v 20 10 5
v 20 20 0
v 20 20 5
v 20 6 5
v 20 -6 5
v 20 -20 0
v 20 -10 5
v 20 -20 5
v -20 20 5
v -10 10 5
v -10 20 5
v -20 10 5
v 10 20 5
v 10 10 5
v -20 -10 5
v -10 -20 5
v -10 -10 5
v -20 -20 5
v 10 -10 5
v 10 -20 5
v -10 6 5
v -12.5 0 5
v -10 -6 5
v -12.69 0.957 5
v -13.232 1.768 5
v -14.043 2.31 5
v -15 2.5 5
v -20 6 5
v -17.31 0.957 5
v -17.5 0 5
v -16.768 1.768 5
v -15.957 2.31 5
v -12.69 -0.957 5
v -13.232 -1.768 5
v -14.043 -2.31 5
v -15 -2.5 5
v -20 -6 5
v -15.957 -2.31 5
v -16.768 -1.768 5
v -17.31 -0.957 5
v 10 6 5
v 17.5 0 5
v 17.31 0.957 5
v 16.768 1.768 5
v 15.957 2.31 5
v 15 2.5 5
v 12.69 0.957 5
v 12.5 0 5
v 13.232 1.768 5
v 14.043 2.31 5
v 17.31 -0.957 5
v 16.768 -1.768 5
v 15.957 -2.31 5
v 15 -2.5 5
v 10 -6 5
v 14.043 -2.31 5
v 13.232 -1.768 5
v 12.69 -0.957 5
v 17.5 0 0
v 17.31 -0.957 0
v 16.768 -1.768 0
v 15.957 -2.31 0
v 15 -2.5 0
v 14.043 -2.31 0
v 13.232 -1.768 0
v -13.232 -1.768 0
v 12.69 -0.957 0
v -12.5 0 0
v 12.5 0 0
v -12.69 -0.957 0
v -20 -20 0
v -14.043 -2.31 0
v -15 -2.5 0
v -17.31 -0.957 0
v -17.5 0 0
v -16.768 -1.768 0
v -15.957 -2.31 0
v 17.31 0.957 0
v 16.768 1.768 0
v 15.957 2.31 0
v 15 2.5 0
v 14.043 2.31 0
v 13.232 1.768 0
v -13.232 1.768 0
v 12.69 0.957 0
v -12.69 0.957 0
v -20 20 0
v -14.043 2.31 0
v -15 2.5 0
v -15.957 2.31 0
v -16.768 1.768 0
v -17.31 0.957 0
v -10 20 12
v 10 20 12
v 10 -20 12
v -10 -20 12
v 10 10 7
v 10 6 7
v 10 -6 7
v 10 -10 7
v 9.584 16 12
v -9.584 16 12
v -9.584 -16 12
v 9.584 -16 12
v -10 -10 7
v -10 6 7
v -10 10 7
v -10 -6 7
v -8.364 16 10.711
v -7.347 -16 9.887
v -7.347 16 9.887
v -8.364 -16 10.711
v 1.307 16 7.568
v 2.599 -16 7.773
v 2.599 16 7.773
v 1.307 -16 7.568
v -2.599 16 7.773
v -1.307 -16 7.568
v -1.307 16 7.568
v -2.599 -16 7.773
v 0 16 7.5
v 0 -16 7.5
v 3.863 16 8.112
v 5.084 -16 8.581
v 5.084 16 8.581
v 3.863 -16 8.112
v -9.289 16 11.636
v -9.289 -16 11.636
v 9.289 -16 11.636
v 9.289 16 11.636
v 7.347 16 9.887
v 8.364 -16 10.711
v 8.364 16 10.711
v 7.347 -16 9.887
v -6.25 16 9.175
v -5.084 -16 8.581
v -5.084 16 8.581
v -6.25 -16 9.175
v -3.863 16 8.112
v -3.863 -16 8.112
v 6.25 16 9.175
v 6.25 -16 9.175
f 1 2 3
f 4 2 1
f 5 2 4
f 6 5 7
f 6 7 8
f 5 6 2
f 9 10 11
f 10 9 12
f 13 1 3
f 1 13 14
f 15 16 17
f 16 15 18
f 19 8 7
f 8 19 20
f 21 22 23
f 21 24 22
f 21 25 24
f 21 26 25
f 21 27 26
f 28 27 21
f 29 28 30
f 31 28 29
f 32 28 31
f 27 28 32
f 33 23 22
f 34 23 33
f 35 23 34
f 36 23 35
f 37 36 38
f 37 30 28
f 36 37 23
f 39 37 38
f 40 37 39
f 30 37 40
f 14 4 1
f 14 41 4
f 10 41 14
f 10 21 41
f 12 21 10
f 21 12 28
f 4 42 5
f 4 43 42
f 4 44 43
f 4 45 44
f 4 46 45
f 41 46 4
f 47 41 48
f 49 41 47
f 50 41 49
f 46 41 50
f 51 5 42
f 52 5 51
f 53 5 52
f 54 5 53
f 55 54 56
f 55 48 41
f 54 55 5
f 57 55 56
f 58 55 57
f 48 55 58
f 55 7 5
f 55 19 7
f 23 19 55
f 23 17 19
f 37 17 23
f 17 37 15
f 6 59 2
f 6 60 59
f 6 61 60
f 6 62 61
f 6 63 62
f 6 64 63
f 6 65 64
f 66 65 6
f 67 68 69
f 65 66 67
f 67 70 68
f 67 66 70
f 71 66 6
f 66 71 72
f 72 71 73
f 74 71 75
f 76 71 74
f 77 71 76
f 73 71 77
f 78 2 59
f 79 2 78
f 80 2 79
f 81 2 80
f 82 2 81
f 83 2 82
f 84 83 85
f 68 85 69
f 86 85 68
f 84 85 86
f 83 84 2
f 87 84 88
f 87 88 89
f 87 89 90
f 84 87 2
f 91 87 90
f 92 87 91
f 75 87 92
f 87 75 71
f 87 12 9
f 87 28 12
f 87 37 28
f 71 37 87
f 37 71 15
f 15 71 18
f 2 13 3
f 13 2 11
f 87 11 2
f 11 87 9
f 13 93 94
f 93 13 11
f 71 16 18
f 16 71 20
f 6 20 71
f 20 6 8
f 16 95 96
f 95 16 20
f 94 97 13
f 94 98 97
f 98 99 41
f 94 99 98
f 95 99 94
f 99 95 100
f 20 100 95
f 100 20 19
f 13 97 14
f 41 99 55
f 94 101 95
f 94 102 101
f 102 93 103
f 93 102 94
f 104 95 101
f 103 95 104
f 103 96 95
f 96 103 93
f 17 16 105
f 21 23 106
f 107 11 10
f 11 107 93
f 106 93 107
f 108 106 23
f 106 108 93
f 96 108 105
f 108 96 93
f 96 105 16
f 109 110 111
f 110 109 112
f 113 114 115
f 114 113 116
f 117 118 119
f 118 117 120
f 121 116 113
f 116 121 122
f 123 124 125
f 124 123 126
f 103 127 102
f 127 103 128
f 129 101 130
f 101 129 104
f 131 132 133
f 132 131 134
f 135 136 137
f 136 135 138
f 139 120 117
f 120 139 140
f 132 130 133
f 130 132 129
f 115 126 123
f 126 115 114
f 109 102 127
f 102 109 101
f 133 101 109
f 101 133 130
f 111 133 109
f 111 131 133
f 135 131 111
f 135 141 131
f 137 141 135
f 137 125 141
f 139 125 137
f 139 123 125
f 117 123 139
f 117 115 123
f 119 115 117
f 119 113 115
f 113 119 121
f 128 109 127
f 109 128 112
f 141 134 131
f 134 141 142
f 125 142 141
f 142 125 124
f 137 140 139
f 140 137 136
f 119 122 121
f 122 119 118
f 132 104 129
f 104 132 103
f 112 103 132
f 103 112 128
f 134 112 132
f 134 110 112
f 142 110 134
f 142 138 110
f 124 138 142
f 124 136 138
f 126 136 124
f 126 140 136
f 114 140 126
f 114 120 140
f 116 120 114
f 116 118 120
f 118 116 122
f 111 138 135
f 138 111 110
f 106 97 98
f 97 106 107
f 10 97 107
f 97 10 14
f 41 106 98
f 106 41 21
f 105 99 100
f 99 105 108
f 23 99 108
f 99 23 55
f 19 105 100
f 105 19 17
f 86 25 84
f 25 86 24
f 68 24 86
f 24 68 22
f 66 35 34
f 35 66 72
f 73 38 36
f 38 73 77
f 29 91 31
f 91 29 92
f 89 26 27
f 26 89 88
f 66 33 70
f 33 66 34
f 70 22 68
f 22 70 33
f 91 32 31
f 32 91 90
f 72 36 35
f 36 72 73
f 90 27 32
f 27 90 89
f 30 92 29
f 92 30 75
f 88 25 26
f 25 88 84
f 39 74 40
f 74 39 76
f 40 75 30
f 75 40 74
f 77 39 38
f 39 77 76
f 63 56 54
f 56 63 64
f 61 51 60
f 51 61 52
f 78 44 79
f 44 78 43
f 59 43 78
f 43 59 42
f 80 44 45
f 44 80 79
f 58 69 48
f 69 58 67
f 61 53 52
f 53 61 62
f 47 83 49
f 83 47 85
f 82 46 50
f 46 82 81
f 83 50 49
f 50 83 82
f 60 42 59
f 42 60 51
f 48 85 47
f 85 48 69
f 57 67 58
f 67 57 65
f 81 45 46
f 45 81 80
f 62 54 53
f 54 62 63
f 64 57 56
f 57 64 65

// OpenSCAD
$fs=$fs/2;
$fa=$fa/2;

d = 120;
h1=12;
h2=5;


module bol(){
    difference(){
        union(){
            translate([-20, -20, 0])cube([40,40,5]);
            translate([-10, -20, 0])cube([20,40,12]);
            
            
            
        }
        translate([0, 0, 20])rotate([90,0,0])cylinder(r=25/2,32, center = true);
        
        translate([-20, 6, 5])cube([49,4,2]);
        translate([-20, -10, 5])cube([49,4,2]);
        
        translate([-15, 0, -1])cylinder(r=5/2,32, center = true);
        translate([ 15, 0, -1])cylinder(r=5/2,32, center = true);
    }
}

bol();
